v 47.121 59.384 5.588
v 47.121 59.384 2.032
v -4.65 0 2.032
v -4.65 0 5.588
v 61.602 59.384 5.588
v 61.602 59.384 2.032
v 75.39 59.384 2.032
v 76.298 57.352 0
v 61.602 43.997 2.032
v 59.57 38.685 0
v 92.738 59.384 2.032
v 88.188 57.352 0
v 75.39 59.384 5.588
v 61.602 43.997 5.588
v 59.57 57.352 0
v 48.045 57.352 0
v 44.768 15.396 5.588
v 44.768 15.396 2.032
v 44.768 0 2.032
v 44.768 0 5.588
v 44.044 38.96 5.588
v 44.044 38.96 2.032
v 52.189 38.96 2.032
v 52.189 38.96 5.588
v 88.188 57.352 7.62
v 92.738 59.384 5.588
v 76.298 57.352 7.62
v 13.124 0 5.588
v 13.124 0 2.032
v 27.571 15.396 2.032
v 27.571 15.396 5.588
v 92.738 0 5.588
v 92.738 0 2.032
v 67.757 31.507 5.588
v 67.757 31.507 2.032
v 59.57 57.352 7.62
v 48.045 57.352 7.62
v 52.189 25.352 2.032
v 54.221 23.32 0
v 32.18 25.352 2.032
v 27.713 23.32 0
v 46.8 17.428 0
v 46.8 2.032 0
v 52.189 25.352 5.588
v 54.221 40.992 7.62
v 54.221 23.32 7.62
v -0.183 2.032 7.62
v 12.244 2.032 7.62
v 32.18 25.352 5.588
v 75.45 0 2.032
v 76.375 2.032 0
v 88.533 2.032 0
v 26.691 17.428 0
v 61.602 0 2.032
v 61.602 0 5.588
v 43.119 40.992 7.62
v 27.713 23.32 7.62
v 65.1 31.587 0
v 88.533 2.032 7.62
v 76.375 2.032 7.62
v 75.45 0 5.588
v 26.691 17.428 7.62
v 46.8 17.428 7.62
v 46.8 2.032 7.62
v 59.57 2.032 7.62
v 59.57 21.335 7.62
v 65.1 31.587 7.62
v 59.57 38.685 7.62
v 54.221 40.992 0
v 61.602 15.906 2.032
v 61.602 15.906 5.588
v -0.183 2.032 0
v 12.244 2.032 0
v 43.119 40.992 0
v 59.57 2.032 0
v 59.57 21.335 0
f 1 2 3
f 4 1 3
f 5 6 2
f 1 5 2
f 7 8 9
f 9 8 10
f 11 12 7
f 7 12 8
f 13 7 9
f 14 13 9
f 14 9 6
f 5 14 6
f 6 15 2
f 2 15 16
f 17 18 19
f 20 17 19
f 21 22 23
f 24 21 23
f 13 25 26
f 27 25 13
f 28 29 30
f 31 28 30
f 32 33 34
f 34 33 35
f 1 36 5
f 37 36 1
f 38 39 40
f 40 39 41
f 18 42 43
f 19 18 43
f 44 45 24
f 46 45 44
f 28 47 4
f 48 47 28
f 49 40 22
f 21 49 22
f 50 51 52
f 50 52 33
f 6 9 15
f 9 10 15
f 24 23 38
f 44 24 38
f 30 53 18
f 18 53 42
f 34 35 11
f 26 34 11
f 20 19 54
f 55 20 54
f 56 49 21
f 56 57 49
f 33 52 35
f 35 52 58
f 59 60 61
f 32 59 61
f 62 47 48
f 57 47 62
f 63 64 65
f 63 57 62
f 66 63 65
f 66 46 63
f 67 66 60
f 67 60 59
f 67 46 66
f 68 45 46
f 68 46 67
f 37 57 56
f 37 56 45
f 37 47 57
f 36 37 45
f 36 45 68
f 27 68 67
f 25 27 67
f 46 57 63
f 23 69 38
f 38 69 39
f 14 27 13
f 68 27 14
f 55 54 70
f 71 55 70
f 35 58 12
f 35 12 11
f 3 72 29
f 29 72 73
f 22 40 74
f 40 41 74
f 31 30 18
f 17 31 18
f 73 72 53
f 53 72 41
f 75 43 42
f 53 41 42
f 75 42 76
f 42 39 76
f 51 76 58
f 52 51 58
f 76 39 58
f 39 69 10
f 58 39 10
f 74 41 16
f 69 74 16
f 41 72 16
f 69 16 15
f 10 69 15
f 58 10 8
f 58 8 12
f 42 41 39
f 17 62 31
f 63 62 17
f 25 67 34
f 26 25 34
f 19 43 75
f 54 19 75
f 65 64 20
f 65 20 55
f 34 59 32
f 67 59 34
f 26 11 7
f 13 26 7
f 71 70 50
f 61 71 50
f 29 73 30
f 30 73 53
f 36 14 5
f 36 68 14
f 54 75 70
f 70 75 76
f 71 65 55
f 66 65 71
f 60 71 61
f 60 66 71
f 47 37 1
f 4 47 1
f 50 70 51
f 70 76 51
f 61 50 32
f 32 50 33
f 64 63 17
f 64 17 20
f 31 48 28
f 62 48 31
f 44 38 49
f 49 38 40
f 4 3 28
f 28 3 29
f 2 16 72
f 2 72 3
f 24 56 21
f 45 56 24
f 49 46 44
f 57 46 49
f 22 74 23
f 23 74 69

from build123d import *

# Parameters (mm, degrees)
F1_DEPTH = 7.62
F2_SIZE  = 2.032


with BuildPart() as f1:
    # F0 (on Top) → F1 (new body)
    with BuildSketch(Plane.XY):
        Polygon((-4.650212, 0), (0, 0), (13.123814, 0), (27.571009, 15.396307), (32.54258, 15.396307), (44.767726, 15.396307), (44.767726, 0), (58.344088, 0), (61.602417, 0), (61.602417, 13.099327), (61.602417, 15.906334), (75.450297, 0), (77.894047, 0), (92.737518, 0), (67.757033, 31.506918), (92.737518, 59.383705), (78.075059, 59.383705), (75.39035, 59.383705), (61.602417, 43.997165), (61.602417, 59.383705), (58.344088, 59.383705), (47.120962, 59.383705), align=None)
        Polygon((44.043656, 38.960008), (48.304201, 38.960008), (52.189469, 38.960008), (52.189469, 25.352303), (36.440898, 25.352303), (32.180353, 25.352303), align=None, mode=Mode.SUBTRACT)
    extrude(amount=F1_DEPTH)

    # F2
    f2_edges = [f1.edges().sort_by_distance(p)[0] for p in [
        (21.235375, 29.691853, 7.62),
        (4.236801, 0, 7.62),
        (20.347412, 7.698154, 7.62),
        (36.169368, 15.396307, 7.62),
        (44.767726, 7.698154, 7.62),
        (53.185072, 0, 7.62),
        (61.602417, 7.953167, 7.62),
        (68.526357, 7.953167, 7.62),
        (84.093908, 0, 7.62),
        (80.247276, 15.753459, 7.62),
        (80.247276, 45.445312, 7.62),
        (84.063934, 59.383705, 7.62),
        (68.496384, 51.690435, 7.62),
        (61.602417, 51.690435, 7.62),
        (54.36169, 59.383705, 7.62),
        (38.112005, 32.156156, 7.62),
        (48.116563, 38.960008, 7.62),
        (52.189469, 32.156156, 7.62),
        (42.184911, 25.352303, 7.62),
        (21.235375, 29.691853, 0),
        (4.236801, 0, 0),
        (20.347412, 7.698154, 0),
        (36.169368, 15.396307, 0),
        (44.767726, 7.698154, 0),
        (53.185072, 0, 0),
        (61.602417, 7.953167, 0),
        (68.526357, 7.953167, 0),
        (84.093908, 0, 0),
        (80.247276, 15.753459, 0),
        (80.247276, 45.445312, 0),
        (84.063934, 59.383705, 0),
        (68.496384, 51.690435, 0),
        (61.602417, 51.690435, 0),
        (54.36169, 59.383705, 0),
        (38.112005, 32.156156, 0),
        (48.116563, 38.960008, 0),
        (52.189469, 32.156156, 0),
        (42.184911, 25.352303, 0),
    ]]
    chamfer(f2_edges, length=F2_SIZE)


solid = f1.part
